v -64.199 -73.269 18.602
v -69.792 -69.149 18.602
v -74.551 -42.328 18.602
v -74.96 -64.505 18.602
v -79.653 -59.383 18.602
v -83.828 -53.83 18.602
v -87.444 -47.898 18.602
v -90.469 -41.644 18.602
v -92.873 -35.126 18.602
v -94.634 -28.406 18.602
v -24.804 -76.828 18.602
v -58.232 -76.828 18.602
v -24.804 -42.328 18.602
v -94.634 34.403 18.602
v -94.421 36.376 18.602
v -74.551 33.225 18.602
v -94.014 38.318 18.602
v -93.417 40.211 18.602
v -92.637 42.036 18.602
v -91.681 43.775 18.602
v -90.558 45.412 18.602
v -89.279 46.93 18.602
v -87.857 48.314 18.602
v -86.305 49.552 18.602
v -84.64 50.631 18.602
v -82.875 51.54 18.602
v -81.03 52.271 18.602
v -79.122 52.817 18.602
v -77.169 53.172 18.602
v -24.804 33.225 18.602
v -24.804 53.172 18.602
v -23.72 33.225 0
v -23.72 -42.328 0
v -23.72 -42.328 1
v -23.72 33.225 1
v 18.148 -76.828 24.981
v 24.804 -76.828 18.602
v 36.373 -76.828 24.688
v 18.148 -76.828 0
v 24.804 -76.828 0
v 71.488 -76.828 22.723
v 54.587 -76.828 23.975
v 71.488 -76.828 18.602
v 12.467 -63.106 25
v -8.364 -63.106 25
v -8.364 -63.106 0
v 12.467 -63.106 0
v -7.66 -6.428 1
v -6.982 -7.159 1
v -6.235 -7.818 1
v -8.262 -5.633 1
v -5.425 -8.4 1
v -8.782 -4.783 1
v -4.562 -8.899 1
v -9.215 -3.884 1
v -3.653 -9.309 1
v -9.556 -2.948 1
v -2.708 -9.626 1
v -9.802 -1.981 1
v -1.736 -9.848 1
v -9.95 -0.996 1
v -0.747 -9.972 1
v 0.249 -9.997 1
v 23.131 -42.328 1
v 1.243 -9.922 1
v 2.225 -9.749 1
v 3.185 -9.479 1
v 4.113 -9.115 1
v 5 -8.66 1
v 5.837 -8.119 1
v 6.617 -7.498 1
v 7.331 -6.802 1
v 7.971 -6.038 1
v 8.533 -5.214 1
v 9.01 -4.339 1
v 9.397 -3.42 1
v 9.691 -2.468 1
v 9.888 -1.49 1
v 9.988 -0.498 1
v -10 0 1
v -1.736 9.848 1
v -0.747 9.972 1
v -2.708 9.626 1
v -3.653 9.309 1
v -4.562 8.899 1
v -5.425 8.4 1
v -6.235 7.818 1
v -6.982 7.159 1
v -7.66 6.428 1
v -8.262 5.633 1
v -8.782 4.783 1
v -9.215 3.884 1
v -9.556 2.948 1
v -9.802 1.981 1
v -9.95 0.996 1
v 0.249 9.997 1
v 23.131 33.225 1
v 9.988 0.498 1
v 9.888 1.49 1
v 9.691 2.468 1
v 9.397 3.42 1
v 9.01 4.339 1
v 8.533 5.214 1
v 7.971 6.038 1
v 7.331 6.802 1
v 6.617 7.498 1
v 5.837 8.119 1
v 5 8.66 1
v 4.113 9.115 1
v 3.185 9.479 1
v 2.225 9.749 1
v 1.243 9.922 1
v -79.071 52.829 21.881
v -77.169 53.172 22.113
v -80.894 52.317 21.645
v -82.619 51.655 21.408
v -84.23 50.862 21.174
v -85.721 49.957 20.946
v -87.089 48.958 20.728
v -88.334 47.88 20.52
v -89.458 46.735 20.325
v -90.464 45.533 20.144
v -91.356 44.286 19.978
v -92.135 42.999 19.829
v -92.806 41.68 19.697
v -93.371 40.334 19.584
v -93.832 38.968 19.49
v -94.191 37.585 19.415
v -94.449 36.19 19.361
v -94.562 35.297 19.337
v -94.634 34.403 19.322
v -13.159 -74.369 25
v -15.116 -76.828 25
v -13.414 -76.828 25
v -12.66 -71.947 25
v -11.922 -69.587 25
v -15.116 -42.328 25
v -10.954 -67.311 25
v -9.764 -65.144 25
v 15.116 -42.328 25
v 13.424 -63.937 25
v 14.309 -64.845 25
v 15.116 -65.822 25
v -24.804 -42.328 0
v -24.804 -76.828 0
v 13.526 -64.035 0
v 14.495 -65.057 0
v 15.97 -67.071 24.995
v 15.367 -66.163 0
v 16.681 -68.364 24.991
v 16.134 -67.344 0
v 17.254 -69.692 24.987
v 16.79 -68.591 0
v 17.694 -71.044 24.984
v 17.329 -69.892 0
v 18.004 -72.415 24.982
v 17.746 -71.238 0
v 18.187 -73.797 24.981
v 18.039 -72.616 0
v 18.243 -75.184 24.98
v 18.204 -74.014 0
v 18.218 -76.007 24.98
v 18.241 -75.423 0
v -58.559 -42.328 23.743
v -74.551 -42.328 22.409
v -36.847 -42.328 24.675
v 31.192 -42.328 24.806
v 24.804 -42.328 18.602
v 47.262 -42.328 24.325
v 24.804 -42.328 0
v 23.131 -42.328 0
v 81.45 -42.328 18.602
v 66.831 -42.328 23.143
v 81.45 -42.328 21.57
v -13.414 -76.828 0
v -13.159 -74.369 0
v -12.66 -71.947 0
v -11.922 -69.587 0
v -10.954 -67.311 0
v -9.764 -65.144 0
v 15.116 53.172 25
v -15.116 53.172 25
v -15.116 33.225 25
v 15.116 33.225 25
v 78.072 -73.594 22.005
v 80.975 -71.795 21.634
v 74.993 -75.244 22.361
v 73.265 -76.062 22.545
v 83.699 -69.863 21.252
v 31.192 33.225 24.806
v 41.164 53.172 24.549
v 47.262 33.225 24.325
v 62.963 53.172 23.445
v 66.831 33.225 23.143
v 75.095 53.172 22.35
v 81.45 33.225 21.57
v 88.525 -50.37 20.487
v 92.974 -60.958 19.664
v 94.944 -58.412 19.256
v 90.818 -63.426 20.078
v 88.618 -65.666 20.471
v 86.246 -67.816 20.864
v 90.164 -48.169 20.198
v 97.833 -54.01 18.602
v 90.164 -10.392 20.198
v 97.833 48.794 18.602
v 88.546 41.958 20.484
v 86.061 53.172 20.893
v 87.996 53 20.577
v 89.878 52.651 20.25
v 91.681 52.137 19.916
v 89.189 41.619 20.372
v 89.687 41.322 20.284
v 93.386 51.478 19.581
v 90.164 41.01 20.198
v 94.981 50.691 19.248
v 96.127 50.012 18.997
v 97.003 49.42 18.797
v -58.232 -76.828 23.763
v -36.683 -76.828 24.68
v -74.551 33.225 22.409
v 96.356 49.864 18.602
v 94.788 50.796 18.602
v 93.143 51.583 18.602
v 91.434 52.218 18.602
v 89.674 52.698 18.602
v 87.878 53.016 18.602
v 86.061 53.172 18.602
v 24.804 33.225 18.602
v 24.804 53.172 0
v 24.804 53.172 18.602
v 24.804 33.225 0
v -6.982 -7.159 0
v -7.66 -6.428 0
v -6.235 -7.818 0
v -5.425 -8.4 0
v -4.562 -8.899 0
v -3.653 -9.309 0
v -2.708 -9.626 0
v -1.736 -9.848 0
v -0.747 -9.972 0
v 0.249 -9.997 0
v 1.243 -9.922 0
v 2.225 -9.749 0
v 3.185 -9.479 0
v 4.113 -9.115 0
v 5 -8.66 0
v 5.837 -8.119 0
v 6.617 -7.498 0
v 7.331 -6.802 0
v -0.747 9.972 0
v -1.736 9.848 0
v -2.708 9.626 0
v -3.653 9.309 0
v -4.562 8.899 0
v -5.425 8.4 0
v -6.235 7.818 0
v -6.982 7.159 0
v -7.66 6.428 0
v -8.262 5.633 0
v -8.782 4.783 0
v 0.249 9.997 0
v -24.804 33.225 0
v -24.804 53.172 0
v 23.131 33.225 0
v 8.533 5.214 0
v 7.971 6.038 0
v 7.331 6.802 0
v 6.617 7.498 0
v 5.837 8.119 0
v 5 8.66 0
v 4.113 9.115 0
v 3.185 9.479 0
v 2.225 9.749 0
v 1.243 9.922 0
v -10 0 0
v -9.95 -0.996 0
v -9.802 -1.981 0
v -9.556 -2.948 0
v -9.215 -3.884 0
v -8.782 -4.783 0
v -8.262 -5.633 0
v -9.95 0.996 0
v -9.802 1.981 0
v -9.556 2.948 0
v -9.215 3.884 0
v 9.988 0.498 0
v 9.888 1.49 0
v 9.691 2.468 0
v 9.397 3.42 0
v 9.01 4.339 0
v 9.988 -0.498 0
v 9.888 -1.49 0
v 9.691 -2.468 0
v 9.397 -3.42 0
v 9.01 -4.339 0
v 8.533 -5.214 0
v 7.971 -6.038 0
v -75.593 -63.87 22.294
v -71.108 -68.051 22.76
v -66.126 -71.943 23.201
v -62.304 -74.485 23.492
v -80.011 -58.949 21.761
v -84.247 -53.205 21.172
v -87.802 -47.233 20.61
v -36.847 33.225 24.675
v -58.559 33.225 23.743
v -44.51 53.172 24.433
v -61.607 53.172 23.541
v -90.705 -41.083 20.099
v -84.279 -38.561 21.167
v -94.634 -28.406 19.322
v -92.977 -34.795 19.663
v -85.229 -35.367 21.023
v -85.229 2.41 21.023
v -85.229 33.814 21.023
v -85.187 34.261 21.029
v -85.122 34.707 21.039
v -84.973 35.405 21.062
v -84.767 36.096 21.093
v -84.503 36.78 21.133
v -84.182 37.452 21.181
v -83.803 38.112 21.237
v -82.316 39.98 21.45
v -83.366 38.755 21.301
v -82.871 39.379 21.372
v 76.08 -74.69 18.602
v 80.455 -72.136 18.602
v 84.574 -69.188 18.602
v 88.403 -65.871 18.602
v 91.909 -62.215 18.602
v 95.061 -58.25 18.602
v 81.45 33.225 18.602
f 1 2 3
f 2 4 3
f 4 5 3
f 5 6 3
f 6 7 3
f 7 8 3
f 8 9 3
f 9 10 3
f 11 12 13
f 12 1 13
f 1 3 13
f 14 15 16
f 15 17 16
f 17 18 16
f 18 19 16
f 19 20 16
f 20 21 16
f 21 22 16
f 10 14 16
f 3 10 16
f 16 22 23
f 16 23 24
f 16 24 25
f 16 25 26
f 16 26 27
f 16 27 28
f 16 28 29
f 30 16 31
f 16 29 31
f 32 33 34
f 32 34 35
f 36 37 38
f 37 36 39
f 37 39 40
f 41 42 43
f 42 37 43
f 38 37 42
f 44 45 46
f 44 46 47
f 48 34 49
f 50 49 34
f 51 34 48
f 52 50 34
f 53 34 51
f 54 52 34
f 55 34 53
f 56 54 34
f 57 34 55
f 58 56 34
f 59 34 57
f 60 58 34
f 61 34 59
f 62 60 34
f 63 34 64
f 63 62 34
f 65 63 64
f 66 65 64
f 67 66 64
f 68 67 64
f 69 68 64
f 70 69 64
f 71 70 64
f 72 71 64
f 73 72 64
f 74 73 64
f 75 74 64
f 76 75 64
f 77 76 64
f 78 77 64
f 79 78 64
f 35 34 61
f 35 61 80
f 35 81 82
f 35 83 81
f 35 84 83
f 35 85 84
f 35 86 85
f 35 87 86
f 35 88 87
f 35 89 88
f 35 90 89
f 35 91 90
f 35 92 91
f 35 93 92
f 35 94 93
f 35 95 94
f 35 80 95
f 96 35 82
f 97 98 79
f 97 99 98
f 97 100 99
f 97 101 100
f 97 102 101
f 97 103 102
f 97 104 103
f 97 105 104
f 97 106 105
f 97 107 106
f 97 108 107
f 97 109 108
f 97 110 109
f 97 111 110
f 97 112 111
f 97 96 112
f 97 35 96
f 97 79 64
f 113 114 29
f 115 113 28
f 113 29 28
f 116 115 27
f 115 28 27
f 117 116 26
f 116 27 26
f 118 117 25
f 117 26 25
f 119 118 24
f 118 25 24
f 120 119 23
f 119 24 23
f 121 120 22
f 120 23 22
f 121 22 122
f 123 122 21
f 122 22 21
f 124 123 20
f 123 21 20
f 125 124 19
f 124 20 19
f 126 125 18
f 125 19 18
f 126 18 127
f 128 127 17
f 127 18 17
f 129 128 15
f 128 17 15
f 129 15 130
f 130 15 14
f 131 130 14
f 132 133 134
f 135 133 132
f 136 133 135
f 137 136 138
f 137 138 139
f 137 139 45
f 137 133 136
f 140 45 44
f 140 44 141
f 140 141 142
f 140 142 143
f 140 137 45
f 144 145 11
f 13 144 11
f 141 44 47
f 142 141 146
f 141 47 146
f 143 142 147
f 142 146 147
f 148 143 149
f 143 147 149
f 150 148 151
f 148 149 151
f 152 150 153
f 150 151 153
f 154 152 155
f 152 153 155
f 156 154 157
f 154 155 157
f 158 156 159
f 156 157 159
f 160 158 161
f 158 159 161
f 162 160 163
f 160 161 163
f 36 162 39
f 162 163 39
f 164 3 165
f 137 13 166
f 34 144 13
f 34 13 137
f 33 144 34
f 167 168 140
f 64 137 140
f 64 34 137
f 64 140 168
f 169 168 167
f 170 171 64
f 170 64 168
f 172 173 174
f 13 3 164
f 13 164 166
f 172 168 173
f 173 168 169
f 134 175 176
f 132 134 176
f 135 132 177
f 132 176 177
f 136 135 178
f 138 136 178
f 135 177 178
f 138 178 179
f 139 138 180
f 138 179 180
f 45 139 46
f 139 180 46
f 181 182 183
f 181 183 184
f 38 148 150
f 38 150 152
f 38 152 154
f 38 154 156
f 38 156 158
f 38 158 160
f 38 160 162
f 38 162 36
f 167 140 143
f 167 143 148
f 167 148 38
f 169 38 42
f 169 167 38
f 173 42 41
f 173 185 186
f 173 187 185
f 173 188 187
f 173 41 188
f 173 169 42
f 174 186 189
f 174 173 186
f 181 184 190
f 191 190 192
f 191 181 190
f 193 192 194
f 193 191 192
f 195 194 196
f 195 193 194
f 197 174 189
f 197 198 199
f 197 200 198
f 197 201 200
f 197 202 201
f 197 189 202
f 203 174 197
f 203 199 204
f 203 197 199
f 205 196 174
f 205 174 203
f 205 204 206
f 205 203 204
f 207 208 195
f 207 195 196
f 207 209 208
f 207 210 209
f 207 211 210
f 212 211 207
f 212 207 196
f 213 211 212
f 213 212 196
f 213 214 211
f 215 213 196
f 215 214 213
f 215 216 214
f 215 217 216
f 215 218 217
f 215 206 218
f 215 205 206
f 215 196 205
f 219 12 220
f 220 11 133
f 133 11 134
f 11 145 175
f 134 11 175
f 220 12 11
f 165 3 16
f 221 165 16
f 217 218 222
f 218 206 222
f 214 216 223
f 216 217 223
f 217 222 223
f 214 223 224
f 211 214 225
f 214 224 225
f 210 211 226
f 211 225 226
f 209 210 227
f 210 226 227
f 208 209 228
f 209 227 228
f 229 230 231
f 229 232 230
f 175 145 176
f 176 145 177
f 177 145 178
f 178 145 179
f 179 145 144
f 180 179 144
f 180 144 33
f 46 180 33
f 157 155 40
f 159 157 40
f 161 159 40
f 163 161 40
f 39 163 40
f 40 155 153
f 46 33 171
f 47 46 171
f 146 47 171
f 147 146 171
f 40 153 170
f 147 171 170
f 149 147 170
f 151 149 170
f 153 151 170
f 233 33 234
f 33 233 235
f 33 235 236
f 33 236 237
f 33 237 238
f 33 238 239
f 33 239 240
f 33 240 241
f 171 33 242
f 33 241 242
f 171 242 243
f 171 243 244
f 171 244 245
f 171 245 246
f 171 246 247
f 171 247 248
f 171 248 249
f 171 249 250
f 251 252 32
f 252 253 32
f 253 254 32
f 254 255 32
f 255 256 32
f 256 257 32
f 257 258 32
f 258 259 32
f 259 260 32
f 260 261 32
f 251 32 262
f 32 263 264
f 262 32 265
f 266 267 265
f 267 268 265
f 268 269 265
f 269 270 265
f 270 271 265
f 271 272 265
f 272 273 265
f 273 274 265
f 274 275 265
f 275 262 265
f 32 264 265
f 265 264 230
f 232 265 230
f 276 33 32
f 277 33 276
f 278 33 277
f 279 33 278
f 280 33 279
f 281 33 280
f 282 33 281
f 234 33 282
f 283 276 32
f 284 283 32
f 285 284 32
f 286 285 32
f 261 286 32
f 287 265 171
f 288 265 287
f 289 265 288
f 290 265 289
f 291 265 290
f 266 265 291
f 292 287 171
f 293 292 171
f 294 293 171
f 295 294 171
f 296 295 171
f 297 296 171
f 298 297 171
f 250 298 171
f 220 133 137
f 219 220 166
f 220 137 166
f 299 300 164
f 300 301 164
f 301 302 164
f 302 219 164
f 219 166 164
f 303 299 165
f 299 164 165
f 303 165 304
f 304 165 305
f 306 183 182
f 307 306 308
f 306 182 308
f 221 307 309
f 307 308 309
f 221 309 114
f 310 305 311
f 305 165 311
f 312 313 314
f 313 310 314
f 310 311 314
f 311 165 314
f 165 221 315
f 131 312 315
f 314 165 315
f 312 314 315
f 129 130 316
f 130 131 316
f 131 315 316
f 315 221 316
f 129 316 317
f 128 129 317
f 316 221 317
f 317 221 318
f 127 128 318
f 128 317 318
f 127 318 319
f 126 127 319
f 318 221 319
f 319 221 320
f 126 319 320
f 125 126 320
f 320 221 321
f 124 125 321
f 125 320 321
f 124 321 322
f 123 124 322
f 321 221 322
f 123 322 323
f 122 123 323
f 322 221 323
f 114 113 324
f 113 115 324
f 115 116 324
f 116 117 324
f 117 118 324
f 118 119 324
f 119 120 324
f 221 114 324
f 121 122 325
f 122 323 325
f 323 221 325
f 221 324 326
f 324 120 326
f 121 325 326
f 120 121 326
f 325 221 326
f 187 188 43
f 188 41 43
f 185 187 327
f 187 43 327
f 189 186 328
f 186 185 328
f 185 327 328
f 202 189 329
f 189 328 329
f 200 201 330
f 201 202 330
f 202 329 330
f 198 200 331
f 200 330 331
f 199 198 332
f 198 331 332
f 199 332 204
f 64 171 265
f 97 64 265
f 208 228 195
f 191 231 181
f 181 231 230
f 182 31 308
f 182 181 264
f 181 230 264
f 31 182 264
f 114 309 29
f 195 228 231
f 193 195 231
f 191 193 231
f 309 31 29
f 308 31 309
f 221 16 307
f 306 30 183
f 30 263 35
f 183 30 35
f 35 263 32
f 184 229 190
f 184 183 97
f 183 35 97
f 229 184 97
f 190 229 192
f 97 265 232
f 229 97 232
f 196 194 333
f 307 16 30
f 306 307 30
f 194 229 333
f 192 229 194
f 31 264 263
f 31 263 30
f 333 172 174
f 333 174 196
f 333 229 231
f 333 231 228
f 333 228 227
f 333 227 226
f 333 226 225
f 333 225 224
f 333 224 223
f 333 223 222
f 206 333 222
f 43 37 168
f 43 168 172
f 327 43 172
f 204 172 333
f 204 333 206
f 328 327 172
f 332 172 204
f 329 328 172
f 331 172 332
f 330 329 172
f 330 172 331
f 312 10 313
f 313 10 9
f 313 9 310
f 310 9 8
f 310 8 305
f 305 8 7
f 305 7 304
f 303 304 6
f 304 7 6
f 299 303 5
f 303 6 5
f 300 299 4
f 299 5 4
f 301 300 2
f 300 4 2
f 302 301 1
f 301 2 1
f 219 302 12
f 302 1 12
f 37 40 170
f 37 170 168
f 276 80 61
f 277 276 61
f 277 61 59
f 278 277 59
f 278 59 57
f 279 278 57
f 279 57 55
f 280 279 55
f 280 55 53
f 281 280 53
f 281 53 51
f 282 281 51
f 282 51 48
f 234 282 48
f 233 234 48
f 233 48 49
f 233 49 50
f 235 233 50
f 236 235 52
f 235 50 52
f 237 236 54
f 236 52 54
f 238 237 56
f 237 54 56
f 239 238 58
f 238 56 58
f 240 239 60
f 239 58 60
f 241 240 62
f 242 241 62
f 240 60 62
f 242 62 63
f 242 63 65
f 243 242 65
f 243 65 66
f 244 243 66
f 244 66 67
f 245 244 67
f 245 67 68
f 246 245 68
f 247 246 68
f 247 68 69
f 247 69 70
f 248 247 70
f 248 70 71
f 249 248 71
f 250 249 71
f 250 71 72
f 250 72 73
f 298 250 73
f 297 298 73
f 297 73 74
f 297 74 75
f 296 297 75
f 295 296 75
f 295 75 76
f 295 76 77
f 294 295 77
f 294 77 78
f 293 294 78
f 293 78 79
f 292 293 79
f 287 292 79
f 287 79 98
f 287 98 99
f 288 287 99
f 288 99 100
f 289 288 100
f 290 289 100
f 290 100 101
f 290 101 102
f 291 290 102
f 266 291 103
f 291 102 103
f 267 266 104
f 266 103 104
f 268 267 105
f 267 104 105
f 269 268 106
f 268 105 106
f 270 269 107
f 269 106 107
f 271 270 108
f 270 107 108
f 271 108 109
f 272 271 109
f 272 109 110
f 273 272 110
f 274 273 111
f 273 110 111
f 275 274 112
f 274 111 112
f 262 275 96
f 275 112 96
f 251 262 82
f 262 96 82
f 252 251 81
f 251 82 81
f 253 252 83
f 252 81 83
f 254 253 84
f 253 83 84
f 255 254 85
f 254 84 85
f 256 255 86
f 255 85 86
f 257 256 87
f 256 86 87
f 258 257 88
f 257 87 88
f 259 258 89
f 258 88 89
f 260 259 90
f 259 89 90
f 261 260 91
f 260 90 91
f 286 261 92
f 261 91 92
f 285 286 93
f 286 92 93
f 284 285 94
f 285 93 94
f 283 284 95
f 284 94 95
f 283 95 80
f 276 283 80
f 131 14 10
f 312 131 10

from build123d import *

# Parameters (mm, degrees)
F0_W     = 156.0007420911
F0_H     = 75.5530648724
F1_DEPTH = 25
F2_W     = 46.8510948122
F2_H     = 75.7792815566
F3_DEPTH = 1
F5_D     = 20
F7_DEPTH = 255
F8_W     = 83.6402047426
F8_H     = 32.7123841271
F9_DEPTH = 100


with BuildPart() as f1:
    # F0 (on Top) → F1 (new body)
    with BuildSketch(Plane.XY):
        with BuildLine():
            Line((84.4286978245, 53.1719140444), (-77.1694108844, 53.1719140444))
            ThreePointArc((-77.1694108844, 53.1719140444), (-89.2789735535, 46.929714102), (-94.6344383061, 34.4027206302))
            Line((-94.6344383061, 34.4027206302), (-94.6344383061, -28.4059178084))
            ThreePointArc((-94.6344383061, -28.4059178084), (-81.8076298673, -56.6572698383), (-58.2321323454, -76.8280859556))
            Line((-58.2321323454, -76.8280859556), (-13.4139051661, -76.8280859556))
            ThreePointArc((-13.4139051661, -76.8280859556), (-11.9224470417, -69.5865469722), (-8.3639649674, -63.105687499))
            Line((-8.3639649674, -63.105687499), (12.4670406803, -63.105687499))
            ThreePointArc((12.4670406803, -63.105687499), (17.0740541232, -69.2355741117), (18.1482266635, -76.8280859556))
            Line((18.1482266635, -76.8280859556), (71.4882239699, -76.8280859556))
            ThreePointArc((71.4882239699, -76.8280859556), (95.5316118327, -57.587637734), (105.3655616939, -28.4059178084))
            Line((105.3655616939, -28.4059178084), (105.3655616939, 35.0339636207))
            ThreePointArc((105.3655616939, 35.0339636207), (99.0954169594, 47.7024097941), (86.0612784494, 53.1719140444))
            Line((86.0612784494, 53.1719140444), (84.4286978245, 53.1719140444))
        make_face()
        with Locations((3.4495101505, -4.5515570394)):
            Rectangle(F0_W, F0_H, mode=Mode.SUBTRACT)
    extrude(amount=F1_DEPTH)

    # F2 (on Top) → F3 (join)
    with BuildSketch(Plane.XY):
        with Locations((-0.2943016589, -4.5300647616)):
            Rectangle(F2_W, F2_H)
    extrude(amount=F3_DEPTH)

    # F5 (through all)
    with Locations(Plane(origin=(0, 0, 0), x_dir=(1, 0, 0), z_dir=(0, 0, -1))):
        with Locations((0, 0)):
            Hole(F5_D / 2)

    # F6 (on face) → F7 (cut)
    with BuildSketch(Plane(origin=(0, 53.1719140444, 0), x_dir=(-1, 0, 0), z_dir=(0, 1, 0))):
        with BuildLine():
            Line((20.4541144112, 28.5491645336), (0, 25))
            add(Edge.make_bspline(
                [(0, 25), (26.840212886, 25.1204533791), (71.8387888182, 24.3904514867), (100.6753190799, 18.4198146688), (107.8883484006, 15.5325448141)],
                knots=[0, 0, 0, 0, 0.5988321729, 1, 1, 1, 1], degree=3))
            Line((107.8883484006, 15.5325448141), (107.8883484006, 28.5491645336))
            Line((107.8883484006, 28.5491645336), (20.4541144112, 28.5491645336))
        make_face()
        with BuildLine():
            add(Edge.make_bspline(
                [(0, 25), (-26.840212886, 25.1204533791), (-71.8387888182, 24.3904514867), (-100.6753190799, 18.4198146688), (-107.8883484006, 15.5325448141)],
                knots=[0, 0, 0, 0, 0.5988321729, 1, 1, 1, 1], degree=3))
            Line((0, 25), (-20.4541144112, 28.5491645336))
            Line((-20.4541144112, 28.5491645336), (-107.8883484006, 28.5491645336))
            Line((-107.8883484006, 28.5491645336), (-107.8883484006, 15.5325448141))
        make_face()
    extrude(amount=-F7_DEPTH, mode=Mode.SUBTRACT)

    # F8 (on Front) → F9 (cut, symmetric)
    with BuildSketch(Plane.XZ):
        with Locations((-66.6241189465, 2.2455067374)):
            Rectangle(F8_W, F8_H)
        with Locations((66.6241189465, 2.2455067374)):
            Rectangle(F8_W, F8_H)
    extrude(amount=F9_DEPTH, both=True, mode=Mode.SUBTRACT)


solid = f1.part
